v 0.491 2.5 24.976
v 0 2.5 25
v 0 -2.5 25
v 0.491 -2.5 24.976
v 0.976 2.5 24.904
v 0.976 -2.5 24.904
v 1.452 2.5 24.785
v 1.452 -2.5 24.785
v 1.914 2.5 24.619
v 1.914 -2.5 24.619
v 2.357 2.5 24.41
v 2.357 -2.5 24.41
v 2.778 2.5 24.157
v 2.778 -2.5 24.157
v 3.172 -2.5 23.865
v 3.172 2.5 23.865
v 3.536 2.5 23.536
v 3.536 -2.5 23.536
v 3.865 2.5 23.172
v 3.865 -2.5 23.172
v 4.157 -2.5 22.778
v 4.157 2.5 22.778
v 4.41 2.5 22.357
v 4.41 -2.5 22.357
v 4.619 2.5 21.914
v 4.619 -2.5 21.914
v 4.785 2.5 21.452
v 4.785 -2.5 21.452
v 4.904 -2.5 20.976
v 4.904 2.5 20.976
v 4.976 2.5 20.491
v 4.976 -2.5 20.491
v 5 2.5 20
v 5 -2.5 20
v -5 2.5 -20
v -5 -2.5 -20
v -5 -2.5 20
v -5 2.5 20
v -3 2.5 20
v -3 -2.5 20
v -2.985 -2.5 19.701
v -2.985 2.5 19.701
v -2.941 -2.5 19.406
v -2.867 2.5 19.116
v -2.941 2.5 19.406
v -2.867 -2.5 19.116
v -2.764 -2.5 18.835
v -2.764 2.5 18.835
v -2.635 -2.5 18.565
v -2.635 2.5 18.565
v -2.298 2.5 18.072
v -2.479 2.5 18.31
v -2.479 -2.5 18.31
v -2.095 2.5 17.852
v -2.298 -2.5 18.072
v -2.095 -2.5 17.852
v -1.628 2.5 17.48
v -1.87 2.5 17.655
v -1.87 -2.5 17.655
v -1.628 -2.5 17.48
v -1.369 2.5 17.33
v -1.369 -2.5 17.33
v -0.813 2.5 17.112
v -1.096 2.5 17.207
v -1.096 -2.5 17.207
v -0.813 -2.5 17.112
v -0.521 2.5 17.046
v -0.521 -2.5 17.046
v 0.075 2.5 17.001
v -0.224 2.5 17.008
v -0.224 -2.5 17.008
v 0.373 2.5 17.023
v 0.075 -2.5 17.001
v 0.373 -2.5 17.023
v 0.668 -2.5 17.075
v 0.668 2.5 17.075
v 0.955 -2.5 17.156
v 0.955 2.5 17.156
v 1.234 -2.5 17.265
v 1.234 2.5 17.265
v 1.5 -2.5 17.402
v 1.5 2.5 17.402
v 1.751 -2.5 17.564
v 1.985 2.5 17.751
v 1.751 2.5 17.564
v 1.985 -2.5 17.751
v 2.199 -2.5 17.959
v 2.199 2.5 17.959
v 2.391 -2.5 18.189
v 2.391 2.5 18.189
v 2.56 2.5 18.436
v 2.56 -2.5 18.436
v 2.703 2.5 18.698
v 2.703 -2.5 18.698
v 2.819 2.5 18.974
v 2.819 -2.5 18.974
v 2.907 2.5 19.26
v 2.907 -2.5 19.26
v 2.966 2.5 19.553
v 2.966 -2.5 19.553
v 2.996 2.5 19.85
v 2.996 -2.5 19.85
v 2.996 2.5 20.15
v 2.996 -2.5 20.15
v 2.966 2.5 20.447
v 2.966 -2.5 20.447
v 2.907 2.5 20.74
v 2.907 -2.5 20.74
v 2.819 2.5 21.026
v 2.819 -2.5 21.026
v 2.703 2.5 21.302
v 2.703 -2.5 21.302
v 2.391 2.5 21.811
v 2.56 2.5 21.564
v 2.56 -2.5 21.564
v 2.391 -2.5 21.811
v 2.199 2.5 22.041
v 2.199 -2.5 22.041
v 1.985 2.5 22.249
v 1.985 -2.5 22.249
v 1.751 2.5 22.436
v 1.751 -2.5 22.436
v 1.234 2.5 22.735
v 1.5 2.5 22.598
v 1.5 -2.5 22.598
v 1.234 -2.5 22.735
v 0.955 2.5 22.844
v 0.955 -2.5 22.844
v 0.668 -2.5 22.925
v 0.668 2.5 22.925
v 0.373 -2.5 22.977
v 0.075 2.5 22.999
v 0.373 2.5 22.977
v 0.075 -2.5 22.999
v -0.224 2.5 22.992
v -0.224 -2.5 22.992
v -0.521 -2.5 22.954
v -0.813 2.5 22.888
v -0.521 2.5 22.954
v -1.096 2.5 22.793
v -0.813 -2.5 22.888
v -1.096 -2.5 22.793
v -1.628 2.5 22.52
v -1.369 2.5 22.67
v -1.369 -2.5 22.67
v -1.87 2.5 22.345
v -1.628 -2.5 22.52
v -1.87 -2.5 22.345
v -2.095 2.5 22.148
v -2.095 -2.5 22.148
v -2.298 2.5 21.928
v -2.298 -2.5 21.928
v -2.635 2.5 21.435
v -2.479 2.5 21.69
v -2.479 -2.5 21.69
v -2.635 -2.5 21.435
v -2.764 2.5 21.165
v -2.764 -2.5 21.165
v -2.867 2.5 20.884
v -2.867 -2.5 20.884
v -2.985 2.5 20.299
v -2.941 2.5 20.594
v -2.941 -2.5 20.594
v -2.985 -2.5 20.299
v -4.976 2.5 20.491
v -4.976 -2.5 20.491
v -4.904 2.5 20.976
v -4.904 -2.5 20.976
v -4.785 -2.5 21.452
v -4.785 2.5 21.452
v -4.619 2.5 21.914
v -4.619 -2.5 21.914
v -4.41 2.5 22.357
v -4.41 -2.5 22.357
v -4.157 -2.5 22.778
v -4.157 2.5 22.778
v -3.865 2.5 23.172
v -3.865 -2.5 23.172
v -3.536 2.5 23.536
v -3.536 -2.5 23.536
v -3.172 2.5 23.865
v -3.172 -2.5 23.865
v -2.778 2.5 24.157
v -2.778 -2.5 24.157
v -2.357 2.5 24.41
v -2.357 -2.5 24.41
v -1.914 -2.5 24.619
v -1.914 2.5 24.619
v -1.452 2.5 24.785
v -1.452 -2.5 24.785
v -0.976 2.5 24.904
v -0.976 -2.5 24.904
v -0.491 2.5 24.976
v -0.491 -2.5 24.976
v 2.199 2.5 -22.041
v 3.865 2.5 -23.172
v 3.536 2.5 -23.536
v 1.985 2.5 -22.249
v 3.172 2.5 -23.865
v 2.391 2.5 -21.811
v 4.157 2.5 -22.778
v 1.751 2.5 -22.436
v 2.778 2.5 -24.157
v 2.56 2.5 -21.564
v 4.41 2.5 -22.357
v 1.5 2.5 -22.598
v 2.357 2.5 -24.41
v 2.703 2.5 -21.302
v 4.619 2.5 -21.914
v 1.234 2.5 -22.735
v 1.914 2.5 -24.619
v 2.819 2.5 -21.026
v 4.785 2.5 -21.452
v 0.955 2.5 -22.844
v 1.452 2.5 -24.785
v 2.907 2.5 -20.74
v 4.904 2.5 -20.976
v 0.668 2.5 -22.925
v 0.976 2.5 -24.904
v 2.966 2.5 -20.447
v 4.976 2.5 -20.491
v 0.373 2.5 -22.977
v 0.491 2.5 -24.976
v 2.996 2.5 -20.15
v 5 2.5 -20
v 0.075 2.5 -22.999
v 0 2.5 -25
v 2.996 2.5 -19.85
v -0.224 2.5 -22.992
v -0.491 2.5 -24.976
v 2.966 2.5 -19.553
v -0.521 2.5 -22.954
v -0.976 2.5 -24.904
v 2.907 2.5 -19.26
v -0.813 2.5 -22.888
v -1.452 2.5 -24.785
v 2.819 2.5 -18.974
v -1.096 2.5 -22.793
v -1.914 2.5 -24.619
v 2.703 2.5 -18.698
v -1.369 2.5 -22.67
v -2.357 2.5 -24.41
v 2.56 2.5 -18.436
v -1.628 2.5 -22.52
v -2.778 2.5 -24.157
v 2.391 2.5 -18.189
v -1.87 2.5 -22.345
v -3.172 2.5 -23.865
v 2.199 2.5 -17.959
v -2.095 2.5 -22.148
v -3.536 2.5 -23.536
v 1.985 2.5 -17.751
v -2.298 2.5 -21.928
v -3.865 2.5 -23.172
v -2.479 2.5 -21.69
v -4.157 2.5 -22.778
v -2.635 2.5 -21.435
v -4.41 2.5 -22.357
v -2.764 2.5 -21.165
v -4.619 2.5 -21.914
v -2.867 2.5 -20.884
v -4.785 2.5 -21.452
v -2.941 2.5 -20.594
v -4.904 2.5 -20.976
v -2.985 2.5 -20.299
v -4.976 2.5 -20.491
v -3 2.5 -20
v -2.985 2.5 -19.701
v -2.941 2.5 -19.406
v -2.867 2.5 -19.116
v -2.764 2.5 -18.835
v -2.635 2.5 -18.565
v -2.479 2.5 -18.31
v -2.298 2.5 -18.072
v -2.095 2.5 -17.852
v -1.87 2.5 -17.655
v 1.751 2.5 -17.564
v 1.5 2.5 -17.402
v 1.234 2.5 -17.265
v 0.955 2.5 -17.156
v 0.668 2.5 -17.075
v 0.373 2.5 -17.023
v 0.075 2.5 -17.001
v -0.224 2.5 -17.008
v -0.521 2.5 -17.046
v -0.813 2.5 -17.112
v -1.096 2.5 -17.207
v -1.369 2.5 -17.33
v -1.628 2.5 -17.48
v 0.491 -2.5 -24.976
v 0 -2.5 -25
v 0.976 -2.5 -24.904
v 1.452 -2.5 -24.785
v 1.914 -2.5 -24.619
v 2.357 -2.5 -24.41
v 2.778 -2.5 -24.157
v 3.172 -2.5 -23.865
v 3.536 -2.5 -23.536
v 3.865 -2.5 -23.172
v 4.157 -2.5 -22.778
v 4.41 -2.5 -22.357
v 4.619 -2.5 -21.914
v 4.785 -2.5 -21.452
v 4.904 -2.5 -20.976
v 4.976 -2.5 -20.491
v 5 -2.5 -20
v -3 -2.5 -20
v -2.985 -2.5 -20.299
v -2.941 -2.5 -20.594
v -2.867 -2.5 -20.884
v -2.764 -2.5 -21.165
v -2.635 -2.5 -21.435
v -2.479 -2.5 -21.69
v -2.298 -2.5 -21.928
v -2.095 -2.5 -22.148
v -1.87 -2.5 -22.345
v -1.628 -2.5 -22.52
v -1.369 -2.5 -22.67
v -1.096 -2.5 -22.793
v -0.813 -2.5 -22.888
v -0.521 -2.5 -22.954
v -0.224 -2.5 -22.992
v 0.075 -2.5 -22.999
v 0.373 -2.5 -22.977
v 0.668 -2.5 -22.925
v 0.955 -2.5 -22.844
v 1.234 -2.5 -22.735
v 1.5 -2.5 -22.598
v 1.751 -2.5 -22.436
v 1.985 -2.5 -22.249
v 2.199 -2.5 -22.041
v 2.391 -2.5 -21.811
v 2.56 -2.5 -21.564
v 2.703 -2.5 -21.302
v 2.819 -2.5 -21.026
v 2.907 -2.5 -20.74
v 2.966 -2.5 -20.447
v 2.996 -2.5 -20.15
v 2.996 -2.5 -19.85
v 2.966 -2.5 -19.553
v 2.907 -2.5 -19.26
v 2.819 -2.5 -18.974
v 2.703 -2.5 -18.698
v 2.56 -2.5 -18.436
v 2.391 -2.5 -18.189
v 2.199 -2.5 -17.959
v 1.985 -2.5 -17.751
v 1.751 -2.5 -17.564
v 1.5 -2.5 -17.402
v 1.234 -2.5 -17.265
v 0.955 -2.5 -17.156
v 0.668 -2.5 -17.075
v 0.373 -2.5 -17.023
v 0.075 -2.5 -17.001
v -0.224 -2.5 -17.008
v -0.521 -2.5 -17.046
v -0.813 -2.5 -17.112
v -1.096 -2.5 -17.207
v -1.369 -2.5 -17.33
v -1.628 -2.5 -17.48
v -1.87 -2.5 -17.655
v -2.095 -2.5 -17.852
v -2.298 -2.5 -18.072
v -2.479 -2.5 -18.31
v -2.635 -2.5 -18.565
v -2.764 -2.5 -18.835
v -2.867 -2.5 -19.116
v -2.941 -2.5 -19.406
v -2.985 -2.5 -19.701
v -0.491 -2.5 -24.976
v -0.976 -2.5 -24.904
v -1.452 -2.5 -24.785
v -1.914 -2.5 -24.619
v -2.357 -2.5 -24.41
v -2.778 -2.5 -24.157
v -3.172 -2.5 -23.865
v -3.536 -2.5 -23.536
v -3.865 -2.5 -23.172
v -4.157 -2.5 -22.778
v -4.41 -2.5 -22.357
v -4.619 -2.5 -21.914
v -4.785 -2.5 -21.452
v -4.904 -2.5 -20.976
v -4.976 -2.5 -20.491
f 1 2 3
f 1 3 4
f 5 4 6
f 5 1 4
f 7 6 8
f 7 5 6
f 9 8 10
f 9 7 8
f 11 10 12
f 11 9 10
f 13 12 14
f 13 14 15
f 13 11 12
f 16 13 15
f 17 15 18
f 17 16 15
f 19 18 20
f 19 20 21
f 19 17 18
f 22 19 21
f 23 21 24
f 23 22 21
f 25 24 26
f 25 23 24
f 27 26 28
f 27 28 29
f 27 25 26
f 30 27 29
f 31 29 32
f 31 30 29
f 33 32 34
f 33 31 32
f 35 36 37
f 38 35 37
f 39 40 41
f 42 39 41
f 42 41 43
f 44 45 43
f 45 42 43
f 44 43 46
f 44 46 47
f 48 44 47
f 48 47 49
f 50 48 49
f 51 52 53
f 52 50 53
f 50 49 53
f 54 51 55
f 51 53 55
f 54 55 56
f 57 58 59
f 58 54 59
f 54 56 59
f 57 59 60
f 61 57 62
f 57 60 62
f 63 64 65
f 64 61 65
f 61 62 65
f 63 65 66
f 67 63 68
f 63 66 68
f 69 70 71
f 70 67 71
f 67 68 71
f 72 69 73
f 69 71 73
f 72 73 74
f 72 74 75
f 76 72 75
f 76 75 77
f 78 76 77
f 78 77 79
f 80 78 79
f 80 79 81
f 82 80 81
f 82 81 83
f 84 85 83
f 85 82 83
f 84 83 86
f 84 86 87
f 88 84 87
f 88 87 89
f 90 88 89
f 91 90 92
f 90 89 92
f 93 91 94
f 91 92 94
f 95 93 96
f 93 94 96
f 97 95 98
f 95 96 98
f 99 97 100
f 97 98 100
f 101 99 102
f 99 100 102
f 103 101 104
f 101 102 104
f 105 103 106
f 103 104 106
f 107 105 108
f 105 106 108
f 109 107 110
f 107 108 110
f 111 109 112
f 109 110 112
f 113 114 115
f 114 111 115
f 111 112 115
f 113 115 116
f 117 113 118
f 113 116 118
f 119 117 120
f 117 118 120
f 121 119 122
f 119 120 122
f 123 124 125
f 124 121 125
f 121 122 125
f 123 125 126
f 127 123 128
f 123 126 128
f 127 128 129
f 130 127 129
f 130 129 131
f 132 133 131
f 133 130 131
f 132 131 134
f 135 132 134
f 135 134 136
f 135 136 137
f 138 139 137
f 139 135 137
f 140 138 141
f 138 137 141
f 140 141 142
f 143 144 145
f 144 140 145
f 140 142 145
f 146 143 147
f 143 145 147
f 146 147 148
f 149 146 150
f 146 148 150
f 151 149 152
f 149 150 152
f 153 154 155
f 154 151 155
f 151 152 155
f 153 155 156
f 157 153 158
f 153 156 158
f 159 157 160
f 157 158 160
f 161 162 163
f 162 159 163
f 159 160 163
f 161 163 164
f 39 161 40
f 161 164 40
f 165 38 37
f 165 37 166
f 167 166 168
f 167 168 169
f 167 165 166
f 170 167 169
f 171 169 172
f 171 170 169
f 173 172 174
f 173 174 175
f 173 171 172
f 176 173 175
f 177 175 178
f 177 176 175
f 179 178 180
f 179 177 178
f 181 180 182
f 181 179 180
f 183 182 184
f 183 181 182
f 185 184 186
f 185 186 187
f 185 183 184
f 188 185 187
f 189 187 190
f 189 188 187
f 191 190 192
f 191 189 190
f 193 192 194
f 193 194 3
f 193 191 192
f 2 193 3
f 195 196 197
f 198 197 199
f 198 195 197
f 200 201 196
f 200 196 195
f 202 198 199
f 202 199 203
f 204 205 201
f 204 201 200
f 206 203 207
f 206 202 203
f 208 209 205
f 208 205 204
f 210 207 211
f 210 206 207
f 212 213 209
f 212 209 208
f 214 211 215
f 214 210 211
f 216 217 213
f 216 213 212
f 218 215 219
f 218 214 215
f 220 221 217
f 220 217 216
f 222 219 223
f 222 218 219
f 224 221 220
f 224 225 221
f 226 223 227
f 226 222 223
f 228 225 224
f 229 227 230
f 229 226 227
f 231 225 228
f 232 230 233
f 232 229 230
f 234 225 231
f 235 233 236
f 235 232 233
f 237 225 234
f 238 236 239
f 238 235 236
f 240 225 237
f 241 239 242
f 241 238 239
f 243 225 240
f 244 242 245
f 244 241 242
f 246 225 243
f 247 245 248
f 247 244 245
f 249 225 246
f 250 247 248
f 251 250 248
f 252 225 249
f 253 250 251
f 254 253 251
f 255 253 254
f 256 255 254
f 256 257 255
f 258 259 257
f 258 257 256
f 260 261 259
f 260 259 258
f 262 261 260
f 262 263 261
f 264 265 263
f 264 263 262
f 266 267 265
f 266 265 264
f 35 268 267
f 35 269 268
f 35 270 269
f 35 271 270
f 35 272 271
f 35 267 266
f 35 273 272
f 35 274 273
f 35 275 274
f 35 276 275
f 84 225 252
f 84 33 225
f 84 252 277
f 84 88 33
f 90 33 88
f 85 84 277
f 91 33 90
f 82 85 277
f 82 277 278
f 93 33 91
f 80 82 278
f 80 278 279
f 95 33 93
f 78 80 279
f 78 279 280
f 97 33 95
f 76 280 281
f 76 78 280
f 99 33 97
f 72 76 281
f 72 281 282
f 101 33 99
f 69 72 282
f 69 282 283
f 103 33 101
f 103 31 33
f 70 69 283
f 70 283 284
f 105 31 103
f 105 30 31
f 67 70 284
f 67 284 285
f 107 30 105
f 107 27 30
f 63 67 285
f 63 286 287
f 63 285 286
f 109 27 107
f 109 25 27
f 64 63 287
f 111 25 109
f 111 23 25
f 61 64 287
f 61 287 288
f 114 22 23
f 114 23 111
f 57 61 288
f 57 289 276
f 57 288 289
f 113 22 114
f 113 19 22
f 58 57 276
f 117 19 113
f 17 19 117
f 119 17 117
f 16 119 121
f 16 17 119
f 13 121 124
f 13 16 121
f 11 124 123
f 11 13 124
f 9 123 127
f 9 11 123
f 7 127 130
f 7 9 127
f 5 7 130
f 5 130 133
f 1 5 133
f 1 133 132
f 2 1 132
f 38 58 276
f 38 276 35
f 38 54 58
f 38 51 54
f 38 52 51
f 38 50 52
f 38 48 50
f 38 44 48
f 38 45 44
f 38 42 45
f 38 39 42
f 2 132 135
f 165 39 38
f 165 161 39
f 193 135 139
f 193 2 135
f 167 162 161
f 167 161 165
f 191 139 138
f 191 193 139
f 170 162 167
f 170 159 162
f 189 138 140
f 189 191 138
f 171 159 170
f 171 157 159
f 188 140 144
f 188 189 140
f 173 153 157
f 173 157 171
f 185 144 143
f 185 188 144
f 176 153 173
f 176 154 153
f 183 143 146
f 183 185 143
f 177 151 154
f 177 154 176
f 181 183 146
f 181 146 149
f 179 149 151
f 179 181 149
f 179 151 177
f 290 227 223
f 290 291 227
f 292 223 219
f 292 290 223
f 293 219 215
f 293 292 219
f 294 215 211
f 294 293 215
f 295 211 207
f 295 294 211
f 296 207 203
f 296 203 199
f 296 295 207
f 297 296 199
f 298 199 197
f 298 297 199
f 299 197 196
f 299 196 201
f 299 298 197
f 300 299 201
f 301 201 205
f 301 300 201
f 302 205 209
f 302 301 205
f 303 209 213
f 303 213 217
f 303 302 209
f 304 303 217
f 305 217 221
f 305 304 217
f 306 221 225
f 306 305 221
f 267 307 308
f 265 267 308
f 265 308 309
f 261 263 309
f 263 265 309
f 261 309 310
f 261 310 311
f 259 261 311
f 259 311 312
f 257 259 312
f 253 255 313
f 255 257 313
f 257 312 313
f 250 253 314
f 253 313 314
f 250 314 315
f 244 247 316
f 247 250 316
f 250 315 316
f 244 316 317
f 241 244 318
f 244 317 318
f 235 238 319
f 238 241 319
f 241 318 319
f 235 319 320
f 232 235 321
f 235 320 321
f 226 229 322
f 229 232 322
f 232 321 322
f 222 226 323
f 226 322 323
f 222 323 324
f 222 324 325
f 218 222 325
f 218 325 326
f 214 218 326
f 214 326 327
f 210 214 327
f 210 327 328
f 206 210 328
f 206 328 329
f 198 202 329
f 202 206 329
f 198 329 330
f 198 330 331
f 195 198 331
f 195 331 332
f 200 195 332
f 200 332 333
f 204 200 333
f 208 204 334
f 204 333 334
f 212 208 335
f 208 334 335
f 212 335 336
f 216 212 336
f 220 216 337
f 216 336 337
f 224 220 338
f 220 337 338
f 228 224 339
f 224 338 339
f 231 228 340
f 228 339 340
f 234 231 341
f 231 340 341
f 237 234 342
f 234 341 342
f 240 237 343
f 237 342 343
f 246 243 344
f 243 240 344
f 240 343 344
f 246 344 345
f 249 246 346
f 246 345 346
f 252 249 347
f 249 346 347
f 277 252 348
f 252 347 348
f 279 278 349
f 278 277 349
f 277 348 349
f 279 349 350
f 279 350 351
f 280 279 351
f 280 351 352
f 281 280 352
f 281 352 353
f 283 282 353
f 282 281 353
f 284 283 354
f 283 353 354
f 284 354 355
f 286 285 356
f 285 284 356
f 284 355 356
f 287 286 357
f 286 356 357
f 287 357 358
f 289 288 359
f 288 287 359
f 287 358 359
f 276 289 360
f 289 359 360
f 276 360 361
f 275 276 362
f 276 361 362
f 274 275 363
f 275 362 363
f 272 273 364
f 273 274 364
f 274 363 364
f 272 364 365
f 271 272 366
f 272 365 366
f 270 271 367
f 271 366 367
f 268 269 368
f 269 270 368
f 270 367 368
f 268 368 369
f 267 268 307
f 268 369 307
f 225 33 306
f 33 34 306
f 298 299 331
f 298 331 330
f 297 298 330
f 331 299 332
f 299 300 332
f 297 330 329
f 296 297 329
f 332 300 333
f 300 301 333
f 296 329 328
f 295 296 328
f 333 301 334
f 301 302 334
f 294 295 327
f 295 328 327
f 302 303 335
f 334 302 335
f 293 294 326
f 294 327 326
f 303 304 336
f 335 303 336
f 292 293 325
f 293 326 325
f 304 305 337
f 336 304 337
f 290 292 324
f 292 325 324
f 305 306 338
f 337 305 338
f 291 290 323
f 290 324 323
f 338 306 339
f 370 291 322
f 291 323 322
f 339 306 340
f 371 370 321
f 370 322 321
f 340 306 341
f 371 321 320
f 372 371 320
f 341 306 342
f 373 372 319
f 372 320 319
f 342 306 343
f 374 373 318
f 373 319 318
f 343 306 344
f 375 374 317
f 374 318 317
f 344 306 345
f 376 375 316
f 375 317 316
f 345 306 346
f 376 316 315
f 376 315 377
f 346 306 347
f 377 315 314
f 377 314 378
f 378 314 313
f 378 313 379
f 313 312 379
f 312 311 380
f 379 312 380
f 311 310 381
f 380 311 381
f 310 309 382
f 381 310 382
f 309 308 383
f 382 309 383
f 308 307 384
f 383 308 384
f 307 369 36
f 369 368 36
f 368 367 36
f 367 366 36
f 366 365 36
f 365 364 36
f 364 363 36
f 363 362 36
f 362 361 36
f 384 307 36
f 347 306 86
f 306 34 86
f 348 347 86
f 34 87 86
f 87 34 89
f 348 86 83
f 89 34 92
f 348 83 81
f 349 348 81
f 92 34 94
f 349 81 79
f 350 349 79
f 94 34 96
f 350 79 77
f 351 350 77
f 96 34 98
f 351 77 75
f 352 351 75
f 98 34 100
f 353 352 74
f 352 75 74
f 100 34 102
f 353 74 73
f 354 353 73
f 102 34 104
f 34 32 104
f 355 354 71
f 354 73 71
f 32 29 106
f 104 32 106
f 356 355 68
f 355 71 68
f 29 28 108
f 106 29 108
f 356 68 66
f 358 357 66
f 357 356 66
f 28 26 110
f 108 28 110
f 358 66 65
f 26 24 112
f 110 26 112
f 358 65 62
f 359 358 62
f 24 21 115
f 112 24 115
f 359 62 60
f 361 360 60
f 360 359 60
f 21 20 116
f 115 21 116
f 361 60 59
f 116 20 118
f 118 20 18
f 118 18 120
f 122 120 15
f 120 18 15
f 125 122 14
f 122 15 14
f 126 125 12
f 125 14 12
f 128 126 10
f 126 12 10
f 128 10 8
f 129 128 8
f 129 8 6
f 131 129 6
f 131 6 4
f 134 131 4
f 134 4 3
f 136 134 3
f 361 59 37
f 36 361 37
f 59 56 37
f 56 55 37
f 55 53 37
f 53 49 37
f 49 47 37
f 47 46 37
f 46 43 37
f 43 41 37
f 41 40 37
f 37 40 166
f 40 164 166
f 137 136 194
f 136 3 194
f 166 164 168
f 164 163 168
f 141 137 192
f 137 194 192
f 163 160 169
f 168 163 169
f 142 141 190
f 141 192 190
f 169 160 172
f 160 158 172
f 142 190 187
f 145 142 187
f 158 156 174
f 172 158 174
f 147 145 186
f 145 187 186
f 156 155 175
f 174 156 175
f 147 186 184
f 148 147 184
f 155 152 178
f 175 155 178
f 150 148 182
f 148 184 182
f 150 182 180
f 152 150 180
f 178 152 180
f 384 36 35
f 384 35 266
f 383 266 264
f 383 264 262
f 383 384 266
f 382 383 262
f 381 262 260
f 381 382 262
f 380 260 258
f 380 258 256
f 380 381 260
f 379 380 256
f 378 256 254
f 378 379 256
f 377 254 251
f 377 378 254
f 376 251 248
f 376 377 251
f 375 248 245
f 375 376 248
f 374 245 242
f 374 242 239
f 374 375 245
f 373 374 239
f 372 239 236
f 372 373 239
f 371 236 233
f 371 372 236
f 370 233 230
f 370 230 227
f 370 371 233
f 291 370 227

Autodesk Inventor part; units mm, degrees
ref_plane "YZ Plane" through (0, 0, 0) normal (1, 0, 0) x (0, 1, 0)
ref_plane "XZ Plane" through (0, 0, 0) normal (0, 1, 0) x (-1, 0, 0)
ref_plane "XY Plane" through (0, 0, 0) normal (0, 0, 1) x (1, 0, 0)
sketch "Boceto1" plane through (0, 0, 0) normal (0, 1, 0) x (-1, 0, 0)
  line L0 (5, 25) -> (-5, 25)
  line L1 (-5, 25) -> (-5, -25)
  line L2 (-5, -25) -> (5, -25)
  line L3 (5, -25) -> (5, 25)
  line L4 (5, 25) -> (-5, -25) construction
  line L5 (-5, 25) -> (5, -25) construction
  circle A0 centre (0, 20) radius 3
  circle A1 centre (0, -20) radius 3
  point P0 (0, 0)
  dimension "d0" = 10
  dimension "d1" = 50
  dimension "d2" = 6
  dimension "d3" = 6
  dimension "d4" = 5
  dimension "d5" = 5
extrude "Extrusión1" add sketch "Boceto1" along normal mid plane 5
fillet "Empalme1" radius 5 4 edges at (5, 0, 25) (-5, 0, 25) (5, 0, -25) (-5, 0, -25)
properties material "Titanio"
